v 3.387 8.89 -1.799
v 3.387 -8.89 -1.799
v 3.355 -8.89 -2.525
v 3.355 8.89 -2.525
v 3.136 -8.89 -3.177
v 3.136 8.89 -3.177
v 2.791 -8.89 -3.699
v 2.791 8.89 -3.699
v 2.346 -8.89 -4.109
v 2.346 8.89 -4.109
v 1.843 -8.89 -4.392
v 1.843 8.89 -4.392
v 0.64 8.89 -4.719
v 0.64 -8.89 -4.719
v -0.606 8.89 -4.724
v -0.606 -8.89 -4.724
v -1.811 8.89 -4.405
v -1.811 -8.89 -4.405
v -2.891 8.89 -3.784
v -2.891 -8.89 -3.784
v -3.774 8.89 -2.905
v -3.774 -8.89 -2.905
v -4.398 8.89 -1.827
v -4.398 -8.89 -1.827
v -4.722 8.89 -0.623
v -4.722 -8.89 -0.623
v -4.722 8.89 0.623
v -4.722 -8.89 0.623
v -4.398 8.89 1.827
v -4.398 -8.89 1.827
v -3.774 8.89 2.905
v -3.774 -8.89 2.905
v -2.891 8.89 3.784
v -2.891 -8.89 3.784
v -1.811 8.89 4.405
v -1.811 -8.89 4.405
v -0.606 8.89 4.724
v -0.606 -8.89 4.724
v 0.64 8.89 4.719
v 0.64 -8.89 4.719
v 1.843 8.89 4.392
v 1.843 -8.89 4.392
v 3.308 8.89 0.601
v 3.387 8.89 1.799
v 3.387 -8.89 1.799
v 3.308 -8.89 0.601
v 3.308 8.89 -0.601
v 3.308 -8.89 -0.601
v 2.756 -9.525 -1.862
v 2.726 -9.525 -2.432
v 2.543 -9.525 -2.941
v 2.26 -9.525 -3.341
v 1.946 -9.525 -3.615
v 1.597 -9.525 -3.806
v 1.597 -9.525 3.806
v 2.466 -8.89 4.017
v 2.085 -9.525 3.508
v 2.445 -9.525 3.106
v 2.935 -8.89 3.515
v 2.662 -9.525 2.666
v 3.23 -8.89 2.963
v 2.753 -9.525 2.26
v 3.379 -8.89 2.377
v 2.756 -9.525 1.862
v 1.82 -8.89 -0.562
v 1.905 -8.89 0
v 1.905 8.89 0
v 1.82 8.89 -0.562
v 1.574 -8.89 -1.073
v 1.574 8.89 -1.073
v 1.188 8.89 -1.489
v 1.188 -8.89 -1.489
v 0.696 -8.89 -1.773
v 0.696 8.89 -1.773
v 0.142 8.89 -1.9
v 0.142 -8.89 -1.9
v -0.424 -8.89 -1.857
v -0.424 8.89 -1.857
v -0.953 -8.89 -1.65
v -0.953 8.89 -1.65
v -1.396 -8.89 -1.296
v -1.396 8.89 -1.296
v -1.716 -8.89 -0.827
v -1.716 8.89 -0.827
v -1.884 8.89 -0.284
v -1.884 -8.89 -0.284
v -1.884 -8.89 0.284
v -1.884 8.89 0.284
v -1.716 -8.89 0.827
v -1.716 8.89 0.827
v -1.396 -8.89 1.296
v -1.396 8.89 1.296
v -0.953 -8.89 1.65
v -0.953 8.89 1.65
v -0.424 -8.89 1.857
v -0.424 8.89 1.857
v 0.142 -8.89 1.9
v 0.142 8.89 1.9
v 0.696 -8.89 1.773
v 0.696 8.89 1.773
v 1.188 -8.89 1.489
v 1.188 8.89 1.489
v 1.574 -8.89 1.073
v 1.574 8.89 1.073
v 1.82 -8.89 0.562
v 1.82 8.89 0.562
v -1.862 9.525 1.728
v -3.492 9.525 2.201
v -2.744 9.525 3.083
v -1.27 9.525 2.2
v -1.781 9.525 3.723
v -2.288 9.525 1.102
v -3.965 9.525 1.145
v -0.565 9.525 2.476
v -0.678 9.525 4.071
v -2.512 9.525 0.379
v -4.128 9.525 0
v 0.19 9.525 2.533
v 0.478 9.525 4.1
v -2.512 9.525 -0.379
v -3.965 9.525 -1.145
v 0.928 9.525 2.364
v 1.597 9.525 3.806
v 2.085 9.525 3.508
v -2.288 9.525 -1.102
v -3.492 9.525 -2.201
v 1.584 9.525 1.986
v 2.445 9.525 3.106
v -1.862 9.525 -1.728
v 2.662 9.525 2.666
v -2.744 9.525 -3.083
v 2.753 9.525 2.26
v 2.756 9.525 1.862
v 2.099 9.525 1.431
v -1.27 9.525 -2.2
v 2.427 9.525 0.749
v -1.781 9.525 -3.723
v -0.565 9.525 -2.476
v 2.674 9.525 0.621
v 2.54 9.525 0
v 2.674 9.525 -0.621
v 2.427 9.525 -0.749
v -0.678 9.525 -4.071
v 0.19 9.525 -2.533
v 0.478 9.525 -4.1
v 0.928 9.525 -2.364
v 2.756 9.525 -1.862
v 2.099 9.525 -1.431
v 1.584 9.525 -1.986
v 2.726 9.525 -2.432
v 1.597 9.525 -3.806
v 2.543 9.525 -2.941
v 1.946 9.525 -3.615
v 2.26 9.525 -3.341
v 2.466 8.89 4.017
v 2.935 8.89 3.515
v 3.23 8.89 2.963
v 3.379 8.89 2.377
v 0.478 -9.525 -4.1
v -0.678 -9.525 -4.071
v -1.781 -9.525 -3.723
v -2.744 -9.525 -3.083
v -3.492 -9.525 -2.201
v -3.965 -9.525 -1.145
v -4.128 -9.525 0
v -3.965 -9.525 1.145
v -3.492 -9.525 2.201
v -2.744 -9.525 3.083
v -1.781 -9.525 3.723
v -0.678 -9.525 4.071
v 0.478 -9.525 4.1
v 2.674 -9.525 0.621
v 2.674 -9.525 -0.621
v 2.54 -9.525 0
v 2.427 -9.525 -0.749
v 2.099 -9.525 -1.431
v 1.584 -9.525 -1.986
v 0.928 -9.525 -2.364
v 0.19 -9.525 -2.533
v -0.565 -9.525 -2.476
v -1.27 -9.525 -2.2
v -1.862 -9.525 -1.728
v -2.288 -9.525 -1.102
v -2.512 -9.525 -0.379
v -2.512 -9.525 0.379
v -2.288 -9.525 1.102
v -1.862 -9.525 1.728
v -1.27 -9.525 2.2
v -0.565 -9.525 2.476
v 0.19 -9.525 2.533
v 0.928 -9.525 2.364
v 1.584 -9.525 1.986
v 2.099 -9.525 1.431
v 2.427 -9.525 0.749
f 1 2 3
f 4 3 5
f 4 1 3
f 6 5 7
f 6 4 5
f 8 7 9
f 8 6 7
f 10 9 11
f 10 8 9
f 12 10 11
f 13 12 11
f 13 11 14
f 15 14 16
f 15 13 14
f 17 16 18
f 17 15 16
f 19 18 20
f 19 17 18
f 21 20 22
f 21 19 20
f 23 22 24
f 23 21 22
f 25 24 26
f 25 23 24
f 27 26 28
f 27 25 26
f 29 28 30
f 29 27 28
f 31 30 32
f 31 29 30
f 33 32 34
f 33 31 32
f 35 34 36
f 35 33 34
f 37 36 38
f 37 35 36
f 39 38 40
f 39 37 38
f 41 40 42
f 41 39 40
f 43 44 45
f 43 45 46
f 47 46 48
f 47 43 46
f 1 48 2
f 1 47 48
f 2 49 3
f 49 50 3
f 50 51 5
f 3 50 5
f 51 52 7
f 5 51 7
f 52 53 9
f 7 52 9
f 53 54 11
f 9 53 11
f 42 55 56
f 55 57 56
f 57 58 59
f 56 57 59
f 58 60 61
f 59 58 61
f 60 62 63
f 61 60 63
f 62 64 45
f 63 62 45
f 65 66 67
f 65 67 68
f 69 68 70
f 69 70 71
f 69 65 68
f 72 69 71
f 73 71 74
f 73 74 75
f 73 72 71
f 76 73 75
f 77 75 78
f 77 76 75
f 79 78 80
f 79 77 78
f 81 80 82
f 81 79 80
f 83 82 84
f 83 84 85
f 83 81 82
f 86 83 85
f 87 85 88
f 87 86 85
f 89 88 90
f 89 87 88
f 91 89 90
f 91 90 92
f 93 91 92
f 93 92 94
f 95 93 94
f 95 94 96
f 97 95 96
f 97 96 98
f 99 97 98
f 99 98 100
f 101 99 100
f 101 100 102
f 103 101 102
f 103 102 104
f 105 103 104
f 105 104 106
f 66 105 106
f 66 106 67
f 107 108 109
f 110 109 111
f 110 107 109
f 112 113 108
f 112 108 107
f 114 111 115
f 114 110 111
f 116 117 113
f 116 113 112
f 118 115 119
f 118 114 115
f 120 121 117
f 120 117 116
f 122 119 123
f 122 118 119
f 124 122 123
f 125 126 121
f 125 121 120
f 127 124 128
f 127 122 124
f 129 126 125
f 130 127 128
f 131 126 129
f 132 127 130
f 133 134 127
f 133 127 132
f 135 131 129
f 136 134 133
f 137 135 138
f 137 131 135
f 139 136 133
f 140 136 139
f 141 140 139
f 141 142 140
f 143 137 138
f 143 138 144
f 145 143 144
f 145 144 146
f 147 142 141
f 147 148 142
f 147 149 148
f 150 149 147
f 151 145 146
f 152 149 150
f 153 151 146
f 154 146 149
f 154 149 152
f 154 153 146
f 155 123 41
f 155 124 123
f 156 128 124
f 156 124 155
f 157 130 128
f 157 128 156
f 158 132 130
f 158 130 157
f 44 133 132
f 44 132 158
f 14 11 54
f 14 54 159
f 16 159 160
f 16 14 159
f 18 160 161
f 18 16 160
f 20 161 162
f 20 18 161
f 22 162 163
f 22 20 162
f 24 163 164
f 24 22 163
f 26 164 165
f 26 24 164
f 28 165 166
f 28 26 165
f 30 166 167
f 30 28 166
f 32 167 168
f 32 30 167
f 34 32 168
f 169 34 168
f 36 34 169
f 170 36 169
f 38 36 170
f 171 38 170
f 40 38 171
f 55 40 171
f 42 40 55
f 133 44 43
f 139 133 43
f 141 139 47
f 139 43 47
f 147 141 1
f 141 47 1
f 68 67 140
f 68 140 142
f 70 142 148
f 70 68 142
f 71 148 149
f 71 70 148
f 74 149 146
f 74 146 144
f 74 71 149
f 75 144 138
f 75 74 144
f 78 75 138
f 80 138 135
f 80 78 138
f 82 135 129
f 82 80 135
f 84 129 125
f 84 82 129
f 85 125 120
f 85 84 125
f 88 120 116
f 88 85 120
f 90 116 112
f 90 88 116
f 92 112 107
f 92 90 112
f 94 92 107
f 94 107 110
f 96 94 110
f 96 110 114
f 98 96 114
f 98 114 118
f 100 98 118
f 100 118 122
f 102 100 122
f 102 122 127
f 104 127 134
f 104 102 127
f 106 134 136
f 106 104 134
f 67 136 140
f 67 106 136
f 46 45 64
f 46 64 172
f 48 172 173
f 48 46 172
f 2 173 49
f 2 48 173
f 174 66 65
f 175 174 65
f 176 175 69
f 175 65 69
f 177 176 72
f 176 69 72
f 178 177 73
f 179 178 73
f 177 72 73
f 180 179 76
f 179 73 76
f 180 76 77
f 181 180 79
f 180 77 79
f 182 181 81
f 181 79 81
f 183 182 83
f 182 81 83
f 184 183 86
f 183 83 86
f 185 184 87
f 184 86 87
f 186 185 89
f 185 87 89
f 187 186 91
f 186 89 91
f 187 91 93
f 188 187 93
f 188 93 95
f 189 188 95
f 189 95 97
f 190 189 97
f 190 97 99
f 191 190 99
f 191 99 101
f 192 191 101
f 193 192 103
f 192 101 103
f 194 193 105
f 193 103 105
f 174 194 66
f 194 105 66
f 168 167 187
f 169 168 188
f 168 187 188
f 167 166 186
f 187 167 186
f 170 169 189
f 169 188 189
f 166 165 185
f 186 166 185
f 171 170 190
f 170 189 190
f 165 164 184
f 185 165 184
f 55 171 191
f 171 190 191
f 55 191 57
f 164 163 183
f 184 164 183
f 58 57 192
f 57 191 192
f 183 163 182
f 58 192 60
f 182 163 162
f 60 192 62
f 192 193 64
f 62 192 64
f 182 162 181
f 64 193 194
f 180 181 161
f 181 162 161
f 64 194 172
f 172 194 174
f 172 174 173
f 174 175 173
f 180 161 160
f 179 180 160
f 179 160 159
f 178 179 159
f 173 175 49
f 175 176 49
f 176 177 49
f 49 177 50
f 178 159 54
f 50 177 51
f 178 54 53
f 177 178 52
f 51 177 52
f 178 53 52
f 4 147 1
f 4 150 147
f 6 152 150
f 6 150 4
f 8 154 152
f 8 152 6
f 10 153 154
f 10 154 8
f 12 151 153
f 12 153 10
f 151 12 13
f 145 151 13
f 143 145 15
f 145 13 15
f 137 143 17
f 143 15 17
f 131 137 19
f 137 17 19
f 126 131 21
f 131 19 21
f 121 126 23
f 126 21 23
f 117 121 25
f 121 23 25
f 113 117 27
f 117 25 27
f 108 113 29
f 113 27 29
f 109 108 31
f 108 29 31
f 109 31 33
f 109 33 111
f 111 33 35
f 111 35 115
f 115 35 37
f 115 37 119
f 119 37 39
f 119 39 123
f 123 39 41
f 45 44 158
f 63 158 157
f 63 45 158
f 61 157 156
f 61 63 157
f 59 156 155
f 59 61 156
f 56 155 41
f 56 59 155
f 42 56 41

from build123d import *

# Parameters (mm, degrees)
SKETCH1_R           = 1.905
BOSS_EXTRUDE1_DEPTH = 9.525
FILLET1_R           = 2.54
CHAMFER1_SIZE       = 0.635


with BuildPart() as part:
    # Sketch1 → Boss-Extrude1 (new body, symmetric)
    with BuildSketch(Plane(origin=(0, 0, 0), x_dir=(1, 0, 0), z_dir=(0, 1, 0))):
        with BuildLine():
            ThreePointArc((3.572376077, -3.149529395), (3.298614691, 0), (3.572376077, 3.149529395))
            ThreePointArc((3.572376077, 3.149529395), (-4.7625, 0), (3.572376077, -3.149529395))
        make_face()
        Circle(SKETCH1_R, mode=Mode.SUBTRACT)
    extrude(amount=BOSS_EXTRUDE1_DEPTH, both=True)

    # Fillet1
    fillet1_edges = [part.edges().sort_by_distance(p)[0] for p in [
        (3.572376077, 0, -3.149529395),
        (3.572376077, 0, 3.149529395),
    ]]
    fillet(fillet1_edges, radius=FILLET1_R)

    # Chamfer1
    chamfer1_edges = [part.edges().sort_by_distance(p)[0] for p in [
        (-4.7625, -9.525, 0),
        (-4.7625, 9.525, 0),
        (3.298614691, -9.525, 0),
        (3.041807621, -9.525, 3.349691374),
        (3.041807621, -9.525, -3.349691374),
        (3.298614691, 9.525, 0),
        (3.041807621, 9.525, 3.349691374),
        (3.041807621, 9.525, -3.349691374),
        (-1.905, -9.525, 0),
        (-1.905, 9.525, 0),
    ]]
    chamfer(chamfer1_edges, length=CHAMFER1_SIZE)


solid = part.part
